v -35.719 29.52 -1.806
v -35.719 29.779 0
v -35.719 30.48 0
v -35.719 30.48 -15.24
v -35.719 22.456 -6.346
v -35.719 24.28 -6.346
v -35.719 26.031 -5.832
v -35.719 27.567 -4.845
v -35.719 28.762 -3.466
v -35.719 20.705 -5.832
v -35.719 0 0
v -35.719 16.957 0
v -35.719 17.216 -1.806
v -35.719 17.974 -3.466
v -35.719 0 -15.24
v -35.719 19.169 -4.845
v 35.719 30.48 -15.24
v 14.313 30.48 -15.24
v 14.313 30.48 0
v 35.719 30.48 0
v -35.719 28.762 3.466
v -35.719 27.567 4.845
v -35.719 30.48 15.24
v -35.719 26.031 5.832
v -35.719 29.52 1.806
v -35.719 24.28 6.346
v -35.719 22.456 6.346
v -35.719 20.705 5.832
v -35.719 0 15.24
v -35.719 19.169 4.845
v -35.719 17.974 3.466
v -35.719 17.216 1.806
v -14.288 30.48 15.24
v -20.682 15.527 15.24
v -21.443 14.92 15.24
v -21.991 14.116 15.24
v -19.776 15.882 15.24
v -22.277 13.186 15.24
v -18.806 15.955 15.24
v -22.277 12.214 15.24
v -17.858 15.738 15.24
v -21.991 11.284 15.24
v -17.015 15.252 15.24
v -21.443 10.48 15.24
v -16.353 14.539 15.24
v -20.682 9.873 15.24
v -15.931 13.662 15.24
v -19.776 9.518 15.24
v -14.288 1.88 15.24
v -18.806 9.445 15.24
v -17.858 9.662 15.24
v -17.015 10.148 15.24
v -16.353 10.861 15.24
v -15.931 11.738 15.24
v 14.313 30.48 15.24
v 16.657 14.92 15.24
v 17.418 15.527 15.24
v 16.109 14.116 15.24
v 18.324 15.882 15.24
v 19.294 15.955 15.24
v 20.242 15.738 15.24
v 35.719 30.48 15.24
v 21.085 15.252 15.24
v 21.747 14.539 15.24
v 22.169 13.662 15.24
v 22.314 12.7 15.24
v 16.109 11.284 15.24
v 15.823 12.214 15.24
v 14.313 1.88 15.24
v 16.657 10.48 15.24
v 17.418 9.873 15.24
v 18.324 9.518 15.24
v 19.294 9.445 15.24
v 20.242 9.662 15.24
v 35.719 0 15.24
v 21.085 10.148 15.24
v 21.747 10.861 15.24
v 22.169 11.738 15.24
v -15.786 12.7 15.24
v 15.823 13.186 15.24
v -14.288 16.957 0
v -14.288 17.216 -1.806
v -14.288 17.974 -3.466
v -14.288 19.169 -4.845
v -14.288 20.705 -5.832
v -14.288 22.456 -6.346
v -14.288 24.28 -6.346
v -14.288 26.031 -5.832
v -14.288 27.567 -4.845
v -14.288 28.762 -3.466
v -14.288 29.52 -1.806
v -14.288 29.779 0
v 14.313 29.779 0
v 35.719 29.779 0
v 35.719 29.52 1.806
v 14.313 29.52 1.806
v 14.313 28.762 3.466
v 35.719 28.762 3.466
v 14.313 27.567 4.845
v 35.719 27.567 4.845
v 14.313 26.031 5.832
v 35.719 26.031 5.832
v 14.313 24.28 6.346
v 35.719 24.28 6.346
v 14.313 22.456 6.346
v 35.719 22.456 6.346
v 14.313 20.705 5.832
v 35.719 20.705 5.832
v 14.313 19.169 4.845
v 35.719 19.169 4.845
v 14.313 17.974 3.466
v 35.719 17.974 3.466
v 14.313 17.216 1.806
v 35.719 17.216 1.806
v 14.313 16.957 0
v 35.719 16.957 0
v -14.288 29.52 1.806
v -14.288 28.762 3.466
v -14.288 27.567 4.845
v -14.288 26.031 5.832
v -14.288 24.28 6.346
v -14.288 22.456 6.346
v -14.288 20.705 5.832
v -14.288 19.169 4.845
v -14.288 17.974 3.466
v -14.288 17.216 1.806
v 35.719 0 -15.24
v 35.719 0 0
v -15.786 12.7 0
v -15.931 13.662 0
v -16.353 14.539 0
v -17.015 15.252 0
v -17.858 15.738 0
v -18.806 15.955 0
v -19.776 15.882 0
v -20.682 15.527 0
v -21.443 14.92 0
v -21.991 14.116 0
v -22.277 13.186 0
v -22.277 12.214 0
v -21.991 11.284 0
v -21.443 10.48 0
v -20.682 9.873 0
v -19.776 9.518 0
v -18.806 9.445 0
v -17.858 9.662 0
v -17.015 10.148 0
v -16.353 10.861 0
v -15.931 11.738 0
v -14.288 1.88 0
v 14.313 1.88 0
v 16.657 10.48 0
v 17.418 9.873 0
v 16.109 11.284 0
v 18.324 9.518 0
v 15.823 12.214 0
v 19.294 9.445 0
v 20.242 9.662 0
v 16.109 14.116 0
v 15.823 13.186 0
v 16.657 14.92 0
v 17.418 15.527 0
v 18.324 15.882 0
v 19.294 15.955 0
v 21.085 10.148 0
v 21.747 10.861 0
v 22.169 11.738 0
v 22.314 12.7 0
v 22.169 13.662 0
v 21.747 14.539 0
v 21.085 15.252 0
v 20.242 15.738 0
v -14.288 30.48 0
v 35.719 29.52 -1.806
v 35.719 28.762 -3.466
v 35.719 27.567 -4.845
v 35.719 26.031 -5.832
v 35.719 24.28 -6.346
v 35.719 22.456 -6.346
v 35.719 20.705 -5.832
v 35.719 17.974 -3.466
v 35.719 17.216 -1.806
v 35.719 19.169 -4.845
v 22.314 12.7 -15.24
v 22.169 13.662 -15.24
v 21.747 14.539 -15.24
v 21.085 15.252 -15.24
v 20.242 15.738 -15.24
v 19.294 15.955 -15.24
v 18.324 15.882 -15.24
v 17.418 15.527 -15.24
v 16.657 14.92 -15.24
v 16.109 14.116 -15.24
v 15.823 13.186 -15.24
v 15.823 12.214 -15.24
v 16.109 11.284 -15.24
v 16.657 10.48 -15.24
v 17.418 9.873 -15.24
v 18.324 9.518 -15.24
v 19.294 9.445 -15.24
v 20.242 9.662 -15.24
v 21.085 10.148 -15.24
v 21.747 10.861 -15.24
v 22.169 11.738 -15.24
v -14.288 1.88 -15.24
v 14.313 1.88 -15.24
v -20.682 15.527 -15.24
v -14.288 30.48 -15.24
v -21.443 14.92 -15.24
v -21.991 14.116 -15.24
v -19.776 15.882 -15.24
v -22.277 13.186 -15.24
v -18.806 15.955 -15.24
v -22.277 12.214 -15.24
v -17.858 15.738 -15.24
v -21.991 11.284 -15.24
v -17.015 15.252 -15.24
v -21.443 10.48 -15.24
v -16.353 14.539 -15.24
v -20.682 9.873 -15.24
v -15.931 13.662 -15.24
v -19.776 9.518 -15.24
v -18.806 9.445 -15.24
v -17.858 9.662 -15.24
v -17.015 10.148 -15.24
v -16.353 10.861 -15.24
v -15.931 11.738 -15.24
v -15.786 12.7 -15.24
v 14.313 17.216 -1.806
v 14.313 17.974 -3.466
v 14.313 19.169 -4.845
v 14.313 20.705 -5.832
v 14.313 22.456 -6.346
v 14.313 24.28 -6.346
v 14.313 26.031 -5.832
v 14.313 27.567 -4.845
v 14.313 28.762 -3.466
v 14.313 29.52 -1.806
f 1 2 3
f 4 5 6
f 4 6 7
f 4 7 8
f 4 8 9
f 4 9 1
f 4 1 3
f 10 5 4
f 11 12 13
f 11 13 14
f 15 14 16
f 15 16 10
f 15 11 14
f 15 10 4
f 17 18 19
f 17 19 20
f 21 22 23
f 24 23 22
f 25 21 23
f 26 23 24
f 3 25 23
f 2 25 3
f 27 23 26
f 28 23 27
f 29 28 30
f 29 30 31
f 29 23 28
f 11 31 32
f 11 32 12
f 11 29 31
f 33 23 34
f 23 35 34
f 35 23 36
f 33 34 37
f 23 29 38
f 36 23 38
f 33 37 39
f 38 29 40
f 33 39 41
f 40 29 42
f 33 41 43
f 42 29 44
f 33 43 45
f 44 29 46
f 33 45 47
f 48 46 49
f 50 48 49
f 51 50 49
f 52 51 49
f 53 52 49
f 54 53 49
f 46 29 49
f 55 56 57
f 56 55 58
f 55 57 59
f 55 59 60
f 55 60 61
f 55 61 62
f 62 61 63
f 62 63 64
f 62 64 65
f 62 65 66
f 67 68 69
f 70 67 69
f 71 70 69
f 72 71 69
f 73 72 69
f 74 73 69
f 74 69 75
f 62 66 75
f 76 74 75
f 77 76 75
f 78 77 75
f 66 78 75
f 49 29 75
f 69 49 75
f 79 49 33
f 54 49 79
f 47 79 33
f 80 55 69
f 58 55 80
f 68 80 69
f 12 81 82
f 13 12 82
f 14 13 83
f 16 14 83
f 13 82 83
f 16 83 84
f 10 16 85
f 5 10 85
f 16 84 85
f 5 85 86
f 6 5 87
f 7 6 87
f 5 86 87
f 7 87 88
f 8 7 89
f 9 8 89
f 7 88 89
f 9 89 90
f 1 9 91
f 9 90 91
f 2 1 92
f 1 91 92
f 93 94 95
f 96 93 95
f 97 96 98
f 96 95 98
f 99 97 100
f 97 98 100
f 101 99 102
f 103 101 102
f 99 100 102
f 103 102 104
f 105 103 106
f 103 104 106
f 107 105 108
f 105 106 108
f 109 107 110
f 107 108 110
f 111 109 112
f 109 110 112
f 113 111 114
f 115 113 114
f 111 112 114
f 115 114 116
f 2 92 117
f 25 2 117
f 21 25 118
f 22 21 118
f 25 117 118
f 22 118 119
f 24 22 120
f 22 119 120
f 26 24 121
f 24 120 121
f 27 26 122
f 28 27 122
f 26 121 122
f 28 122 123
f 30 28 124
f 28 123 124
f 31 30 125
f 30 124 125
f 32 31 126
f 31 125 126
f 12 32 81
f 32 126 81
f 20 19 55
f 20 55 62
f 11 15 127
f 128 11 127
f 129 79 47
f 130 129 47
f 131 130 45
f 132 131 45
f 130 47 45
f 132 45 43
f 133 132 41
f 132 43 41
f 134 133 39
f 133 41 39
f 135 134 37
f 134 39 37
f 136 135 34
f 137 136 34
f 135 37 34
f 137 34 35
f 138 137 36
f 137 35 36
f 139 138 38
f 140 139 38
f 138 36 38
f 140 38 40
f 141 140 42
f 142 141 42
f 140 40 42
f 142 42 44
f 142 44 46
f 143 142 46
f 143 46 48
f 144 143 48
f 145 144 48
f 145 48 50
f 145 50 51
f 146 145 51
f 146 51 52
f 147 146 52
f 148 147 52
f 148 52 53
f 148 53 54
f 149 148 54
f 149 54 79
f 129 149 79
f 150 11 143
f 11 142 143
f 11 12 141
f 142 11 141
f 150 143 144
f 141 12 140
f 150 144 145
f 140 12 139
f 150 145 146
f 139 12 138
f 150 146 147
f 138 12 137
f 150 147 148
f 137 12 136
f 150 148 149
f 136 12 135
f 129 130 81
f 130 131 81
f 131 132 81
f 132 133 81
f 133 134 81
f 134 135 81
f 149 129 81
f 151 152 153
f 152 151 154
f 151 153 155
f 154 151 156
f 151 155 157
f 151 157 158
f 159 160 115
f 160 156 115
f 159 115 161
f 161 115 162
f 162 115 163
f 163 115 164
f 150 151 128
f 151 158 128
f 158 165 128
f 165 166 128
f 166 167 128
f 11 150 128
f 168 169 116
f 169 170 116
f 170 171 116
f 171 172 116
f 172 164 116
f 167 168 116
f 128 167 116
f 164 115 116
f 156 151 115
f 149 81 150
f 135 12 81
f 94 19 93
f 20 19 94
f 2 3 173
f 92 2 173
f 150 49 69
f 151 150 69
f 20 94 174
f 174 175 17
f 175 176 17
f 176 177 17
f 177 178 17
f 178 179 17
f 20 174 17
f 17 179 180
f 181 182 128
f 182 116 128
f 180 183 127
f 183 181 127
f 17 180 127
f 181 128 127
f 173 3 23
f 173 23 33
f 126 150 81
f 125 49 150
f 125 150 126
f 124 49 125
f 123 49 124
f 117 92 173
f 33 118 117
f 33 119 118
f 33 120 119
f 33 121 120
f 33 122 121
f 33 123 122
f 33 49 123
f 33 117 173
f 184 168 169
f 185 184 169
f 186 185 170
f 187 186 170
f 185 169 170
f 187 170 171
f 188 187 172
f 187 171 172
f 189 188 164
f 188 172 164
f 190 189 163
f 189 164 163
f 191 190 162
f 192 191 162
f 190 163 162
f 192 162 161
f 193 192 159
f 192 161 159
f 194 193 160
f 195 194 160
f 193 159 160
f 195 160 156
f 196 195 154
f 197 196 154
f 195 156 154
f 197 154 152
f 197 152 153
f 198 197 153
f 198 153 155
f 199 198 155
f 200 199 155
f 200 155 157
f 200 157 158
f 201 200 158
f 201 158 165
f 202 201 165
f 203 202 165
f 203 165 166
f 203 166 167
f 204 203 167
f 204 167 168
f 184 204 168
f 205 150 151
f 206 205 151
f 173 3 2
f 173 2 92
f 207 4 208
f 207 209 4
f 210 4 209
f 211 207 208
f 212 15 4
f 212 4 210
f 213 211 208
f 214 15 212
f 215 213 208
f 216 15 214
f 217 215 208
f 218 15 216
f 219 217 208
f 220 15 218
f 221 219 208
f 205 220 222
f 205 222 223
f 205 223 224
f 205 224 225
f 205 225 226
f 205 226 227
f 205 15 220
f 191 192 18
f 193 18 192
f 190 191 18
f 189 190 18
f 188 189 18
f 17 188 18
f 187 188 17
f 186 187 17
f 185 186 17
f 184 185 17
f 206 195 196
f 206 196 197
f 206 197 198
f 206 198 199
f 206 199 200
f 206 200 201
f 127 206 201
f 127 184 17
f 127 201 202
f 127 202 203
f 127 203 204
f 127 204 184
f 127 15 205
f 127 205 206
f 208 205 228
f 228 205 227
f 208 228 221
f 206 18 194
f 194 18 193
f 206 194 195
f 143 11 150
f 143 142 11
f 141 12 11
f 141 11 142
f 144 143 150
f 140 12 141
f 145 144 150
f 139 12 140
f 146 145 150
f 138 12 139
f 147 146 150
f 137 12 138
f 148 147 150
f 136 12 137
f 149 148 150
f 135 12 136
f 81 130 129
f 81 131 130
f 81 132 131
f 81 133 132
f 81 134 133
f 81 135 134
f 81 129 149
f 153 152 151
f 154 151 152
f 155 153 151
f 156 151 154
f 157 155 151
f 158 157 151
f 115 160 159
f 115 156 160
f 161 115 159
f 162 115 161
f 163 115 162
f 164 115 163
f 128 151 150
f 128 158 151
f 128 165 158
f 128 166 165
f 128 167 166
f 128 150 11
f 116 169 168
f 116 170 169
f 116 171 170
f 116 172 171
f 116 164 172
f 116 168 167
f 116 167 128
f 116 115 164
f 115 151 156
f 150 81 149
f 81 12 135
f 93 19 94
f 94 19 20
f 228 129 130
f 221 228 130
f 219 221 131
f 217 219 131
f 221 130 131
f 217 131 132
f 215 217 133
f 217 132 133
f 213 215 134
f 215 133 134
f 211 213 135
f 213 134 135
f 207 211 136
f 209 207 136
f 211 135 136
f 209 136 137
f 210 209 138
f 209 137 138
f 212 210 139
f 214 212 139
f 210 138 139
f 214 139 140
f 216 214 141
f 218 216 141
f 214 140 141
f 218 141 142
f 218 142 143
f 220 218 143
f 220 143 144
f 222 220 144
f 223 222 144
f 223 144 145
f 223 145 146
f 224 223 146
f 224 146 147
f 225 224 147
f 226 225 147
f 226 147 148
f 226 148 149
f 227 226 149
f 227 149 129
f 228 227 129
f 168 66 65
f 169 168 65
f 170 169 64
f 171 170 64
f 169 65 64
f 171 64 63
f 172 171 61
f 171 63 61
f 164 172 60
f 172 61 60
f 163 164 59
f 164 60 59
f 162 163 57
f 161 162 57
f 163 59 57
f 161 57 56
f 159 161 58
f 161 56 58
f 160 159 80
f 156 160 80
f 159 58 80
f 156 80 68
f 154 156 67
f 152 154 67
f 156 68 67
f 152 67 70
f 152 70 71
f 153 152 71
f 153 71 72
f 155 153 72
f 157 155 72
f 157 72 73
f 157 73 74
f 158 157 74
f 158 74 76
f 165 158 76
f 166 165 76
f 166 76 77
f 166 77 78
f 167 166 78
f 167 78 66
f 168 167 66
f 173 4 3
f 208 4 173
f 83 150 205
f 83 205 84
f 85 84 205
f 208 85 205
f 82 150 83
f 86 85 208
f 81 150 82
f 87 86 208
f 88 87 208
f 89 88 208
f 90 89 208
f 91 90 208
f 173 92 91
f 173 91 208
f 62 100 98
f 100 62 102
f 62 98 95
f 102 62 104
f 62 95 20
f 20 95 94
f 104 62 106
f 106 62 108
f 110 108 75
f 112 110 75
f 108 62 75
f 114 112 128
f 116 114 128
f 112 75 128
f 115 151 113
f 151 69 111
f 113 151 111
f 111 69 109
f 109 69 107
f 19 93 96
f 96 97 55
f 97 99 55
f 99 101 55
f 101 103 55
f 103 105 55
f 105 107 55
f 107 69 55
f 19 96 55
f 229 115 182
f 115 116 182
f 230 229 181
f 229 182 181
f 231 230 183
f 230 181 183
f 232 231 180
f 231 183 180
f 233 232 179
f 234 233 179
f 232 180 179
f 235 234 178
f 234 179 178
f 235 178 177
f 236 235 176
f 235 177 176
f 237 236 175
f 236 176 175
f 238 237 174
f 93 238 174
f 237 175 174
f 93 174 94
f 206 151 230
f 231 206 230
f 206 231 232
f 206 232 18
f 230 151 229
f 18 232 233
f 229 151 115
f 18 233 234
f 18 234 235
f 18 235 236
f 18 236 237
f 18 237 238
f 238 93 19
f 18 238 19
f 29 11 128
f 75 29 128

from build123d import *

# Parameters (mm, degrees)
SKETCH1_W                = 71.4375
SKETCH1_H                = 30.48
BOSS_EXTRUDE1_DEPTH      = 30.48
SKETCH4_W                = 28.6004
SKETCH4_H                = 28.6004
CUT_EXTRUDE1_DEPTH       = 31.496
SKETCH9_R                = 6.41140629
CUT_EXTRUDE2_DEPTH       = 74.168
F_5_16_18_TAPPED_HOLE1_D = 6.5278


# Read off the part's stored shape, not the designer's step: Split3
with BuildPart() as part:
    # Sketch1 → Boss-Extrude1 (new body)
    with BuildSketch(Plane(origin=(0, 0, 0), x_dir=(1, 0, 0), z_dir=(0, 1, 0))):
        Rectangle(SKETCH1_W, SKETCH1_H)
    extrude(amount=BOSS_EXTRUDE1_DEPTH)

    # Sketch4 → Cut-Extrude1 (cut)
    with BuildSketch(Plane.XY.offset(15.24)):
        with Locations((0.0127, 16.1798)):
            Rectangle(SKETCH4_W, SKETCH4_H)
    extrude(amount=-CUT_EXTRUDE1_DEPTH, mode=Mode.SUBTRACT)

    # Sketch9 → Cut-Extrude2 (cut)
    with BuildSketch(Plane(origin=(35.71875, 0, 0), x_dir=(0, 0, -1), z_dir=(1, 0, 0))):
        with Locations((0, 23.368)):
            Circle(SKETCH9_R)
    extrude(amount=-CUT_EXTRUDE2_DEPTH, mode=Mode.SUBTRACT)

    # 5/16-18 Tapped Hole1 (through all)
    with Locations(Plane(origin=(0, 0, -15.24), x_dir=(-1, 0, 0), z_dir=(0, 0, -1))):
        with Locations((-19.05, 12.7), (19.05, 12.7)):
            Hole(F_5_16_18_TAPPED_HOLE1_D / 2)


with BuildPart() as body_2:
    # Split3: the piece on the far side of the plane
    add(part.part)
    split(bisect_by=Plane.XY, keep=Keep.BOTTOM)


with BuildPart() as part_1:
    add(part.part)

    # Split3
    split(bisect_by=Plane.XY, keep=Keep.TOP)


solid = Compound([body_2.part, part_1.part])
